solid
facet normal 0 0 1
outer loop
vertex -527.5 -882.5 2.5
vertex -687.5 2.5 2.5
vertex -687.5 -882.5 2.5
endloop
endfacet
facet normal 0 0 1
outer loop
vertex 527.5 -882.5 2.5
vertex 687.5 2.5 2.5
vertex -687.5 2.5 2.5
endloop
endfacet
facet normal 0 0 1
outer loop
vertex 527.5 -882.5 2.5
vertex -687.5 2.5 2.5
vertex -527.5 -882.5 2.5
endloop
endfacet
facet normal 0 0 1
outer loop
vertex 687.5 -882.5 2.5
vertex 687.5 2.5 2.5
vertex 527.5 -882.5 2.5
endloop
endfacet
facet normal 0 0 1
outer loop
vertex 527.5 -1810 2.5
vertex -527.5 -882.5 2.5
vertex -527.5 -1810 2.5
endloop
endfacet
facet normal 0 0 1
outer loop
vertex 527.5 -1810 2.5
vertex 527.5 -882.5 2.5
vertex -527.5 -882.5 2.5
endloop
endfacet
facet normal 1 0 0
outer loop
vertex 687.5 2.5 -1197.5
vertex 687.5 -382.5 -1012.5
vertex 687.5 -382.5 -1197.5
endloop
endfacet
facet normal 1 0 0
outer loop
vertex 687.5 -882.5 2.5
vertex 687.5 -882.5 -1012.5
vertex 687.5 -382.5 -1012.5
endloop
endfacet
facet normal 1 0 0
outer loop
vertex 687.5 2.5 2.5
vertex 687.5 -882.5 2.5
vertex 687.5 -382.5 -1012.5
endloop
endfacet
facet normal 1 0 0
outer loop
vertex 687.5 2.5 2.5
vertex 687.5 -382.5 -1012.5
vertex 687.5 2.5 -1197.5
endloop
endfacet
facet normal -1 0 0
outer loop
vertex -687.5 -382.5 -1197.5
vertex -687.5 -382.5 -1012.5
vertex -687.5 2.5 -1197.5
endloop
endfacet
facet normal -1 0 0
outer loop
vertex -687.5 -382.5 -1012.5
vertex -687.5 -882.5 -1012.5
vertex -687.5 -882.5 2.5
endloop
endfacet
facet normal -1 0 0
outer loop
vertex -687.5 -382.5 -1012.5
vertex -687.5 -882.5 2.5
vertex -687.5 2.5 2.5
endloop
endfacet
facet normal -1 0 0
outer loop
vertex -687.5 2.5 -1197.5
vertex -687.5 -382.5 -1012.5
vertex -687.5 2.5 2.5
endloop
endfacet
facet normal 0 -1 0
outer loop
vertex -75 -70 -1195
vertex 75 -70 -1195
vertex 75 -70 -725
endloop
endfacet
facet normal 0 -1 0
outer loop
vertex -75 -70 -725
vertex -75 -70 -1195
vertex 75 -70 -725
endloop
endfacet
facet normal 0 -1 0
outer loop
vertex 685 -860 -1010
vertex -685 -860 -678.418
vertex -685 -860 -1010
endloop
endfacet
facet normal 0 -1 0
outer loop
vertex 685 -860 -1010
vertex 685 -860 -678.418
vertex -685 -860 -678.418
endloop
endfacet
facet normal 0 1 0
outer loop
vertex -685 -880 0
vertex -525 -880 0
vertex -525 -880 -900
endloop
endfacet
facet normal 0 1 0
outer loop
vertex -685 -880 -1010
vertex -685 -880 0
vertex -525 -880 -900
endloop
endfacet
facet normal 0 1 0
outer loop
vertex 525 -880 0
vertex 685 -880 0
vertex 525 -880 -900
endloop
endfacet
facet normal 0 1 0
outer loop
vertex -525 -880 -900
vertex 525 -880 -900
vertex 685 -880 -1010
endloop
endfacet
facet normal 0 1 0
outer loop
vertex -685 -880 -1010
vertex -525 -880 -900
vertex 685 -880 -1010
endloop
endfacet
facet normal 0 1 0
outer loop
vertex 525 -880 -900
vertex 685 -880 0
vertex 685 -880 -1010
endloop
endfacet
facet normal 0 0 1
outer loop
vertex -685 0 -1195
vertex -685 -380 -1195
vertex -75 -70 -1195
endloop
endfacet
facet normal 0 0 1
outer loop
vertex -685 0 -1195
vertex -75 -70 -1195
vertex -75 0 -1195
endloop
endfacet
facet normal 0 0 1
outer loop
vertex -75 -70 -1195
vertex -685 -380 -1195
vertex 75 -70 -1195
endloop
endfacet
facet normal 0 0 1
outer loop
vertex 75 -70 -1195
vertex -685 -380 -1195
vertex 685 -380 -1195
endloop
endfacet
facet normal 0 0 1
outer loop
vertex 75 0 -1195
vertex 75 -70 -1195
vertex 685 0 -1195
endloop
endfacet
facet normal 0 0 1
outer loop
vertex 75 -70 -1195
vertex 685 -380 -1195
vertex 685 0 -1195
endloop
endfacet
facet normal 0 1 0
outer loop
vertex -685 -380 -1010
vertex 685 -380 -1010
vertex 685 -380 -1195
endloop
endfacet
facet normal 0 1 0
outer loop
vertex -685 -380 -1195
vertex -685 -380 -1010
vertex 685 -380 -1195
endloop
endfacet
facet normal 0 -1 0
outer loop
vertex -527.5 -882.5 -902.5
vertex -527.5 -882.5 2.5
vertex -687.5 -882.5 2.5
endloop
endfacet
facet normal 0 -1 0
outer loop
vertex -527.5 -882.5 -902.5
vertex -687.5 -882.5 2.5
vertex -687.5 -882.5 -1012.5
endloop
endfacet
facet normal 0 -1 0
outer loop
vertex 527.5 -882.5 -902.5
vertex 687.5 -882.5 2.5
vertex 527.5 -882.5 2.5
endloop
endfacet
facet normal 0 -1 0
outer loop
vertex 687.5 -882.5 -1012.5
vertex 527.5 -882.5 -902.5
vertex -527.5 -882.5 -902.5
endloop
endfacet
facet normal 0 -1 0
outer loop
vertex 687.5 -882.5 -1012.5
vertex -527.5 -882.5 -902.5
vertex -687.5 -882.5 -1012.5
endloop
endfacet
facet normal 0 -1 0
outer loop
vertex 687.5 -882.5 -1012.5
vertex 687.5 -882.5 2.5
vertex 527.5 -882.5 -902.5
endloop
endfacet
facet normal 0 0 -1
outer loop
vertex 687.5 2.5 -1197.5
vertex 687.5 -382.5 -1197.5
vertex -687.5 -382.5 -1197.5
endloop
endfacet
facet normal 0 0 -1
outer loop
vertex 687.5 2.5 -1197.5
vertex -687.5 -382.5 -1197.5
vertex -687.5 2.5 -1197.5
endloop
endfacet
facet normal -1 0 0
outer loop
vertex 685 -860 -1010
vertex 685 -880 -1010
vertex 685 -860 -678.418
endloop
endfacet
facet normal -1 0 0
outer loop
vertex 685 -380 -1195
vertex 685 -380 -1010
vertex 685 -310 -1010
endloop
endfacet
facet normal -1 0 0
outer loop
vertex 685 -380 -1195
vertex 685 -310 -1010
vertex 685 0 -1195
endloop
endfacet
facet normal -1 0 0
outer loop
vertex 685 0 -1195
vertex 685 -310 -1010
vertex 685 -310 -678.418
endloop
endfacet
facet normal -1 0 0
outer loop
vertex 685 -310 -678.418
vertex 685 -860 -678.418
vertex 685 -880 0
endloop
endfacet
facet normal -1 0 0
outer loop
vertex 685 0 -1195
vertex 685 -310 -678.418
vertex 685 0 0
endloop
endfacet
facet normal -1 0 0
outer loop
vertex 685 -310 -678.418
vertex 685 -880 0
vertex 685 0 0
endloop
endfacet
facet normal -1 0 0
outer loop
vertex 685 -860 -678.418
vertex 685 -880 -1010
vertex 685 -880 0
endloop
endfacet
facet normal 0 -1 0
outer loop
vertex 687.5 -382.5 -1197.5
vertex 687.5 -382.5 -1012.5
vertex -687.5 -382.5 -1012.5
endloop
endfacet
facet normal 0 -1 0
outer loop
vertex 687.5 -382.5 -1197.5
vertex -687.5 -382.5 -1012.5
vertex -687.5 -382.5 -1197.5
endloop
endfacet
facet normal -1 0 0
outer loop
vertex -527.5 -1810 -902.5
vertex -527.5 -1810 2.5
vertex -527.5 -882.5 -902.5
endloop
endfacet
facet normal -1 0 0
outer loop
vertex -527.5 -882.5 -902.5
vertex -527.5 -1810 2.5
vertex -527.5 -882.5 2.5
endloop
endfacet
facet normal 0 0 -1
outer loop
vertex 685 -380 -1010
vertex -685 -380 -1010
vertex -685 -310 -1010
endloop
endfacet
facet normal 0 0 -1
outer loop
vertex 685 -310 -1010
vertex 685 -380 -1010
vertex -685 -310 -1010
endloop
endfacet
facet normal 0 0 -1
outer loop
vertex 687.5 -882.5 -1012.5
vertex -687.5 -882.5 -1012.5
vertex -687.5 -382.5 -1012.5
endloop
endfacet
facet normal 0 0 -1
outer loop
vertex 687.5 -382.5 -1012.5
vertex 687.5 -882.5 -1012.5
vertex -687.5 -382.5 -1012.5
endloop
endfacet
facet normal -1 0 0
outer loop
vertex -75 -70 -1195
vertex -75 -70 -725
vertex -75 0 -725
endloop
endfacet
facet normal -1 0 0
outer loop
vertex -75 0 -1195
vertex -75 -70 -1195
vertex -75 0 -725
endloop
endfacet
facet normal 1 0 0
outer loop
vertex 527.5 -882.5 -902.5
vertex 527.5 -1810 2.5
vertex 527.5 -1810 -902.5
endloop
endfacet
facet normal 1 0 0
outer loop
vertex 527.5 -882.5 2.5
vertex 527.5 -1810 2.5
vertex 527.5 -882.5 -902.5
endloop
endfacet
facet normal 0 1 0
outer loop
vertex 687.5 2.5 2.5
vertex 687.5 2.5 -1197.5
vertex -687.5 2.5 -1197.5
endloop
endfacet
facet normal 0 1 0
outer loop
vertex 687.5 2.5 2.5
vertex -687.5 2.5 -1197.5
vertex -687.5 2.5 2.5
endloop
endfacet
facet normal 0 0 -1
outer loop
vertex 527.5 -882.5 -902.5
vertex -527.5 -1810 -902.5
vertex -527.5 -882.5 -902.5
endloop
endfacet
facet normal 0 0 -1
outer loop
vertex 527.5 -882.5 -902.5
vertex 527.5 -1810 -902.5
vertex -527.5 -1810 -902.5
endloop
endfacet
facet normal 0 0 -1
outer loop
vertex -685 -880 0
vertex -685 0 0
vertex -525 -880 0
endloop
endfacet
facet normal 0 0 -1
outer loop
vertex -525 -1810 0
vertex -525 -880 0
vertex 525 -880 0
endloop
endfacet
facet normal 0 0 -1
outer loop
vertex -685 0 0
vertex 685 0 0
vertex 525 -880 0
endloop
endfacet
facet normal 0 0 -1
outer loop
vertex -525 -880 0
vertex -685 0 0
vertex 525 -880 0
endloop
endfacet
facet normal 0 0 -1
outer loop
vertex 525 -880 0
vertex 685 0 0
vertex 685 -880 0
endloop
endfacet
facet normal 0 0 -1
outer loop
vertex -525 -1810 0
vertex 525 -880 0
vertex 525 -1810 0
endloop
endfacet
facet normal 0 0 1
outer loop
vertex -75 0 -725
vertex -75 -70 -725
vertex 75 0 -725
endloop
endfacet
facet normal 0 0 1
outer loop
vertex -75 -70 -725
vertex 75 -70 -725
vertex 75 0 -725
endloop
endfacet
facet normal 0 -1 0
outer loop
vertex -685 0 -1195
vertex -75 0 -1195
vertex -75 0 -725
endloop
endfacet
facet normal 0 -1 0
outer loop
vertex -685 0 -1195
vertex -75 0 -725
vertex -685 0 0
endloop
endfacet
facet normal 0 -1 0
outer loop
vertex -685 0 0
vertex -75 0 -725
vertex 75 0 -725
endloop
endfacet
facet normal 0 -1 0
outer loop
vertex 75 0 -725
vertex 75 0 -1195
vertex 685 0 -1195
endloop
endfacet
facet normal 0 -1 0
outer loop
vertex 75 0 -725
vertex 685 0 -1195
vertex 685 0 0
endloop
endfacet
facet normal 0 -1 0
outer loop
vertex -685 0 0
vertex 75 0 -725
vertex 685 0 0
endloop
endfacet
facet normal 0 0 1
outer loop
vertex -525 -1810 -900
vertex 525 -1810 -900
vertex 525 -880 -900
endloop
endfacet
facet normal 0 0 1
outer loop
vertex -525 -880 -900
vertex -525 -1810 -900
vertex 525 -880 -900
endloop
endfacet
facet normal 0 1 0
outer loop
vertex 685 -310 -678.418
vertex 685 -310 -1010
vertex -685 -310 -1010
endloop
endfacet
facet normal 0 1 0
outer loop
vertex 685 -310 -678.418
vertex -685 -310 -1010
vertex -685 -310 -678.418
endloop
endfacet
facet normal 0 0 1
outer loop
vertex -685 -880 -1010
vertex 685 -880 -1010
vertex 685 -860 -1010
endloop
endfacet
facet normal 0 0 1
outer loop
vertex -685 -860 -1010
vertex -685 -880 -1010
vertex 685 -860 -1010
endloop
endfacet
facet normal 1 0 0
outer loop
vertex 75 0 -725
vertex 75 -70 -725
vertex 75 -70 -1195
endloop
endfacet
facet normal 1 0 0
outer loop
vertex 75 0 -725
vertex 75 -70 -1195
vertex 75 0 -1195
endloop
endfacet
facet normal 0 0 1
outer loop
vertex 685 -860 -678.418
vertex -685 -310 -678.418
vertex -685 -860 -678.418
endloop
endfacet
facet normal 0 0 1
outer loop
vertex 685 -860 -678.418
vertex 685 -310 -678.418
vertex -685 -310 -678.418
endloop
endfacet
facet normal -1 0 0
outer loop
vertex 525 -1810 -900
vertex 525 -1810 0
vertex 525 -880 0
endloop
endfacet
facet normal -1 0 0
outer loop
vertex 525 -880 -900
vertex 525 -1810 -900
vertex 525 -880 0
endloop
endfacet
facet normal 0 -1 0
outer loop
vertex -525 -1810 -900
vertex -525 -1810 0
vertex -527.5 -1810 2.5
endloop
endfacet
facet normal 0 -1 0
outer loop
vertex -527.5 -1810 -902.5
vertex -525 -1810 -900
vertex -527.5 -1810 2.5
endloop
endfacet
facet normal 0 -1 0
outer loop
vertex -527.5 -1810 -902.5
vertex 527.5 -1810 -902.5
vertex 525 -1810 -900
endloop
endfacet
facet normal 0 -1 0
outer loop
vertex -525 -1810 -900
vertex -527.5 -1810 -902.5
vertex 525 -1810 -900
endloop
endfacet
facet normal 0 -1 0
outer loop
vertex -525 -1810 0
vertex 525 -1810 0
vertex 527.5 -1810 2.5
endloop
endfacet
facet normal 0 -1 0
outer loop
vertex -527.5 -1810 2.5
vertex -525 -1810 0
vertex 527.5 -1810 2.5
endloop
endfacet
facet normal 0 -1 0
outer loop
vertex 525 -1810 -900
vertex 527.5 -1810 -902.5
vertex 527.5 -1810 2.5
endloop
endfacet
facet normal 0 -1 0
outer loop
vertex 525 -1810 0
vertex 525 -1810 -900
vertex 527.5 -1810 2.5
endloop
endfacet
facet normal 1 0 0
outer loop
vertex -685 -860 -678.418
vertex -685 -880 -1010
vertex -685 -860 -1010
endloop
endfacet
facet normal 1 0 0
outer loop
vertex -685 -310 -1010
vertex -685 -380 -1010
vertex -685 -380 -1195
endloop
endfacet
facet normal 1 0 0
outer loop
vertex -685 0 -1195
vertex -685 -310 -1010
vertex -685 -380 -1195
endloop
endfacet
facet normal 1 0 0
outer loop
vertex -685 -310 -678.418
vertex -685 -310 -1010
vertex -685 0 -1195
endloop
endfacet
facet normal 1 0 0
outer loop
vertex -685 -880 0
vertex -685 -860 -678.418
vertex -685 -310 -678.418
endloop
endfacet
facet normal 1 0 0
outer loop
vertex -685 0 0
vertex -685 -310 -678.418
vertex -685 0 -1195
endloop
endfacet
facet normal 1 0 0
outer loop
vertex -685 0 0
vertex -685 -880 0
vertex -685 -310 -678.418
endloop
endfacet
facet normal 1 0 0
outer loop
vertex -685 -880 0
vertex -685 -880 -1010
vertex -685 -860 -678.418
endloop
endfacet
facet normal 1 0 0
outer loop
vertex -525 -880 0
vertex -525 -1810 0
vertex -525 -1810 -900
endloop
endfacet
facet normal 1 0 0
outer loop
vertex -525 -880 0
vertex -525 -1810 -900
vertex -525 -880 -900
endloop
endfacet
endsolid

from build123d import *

# Parameters (mm, degrees)
F0_W     = 70
F0_H     = 470
F1_DEPTH = 685
F0_W_2   = 930
F0_H_2   = 900
F2_DEPTH = 525
F3_T     = 2.5
F4_DEPTH = 685
F5_DEPTH = 75


with BuildPart() as f1:
    # F0 (on Right) → F1 (new body, symmetric)
    with BuildSketch(Plane.YZ):
        Polygon((0, -725), (0, 0), (-880, 0), (-880, -900), (-880, -1010), (-860, -1010), (-860, -678.4179210663), (-310, -678.4179210663), (-310, -1010), (-380, -1010), (-380, -1195), (-70, -1195), (-70, -725), align=None)
        with Locations((-35, -960)):
            Rectangle(F0_W, F0_H)
        Polygon((-860, -678.4179210663), (-860, -1010), (-380, -1010), (-310, -1010), (-310, -678.4179210663), align=None)
    extrude(amount=F1_DEPTH, both=True)

    # F0 (on Right) → F2 (join, symmetric)
    with BuildSketch(Plane.YZ):
        with Locations((-1345, -450)):
            Rectangle(F0_W_2, F0_H_2)
    extrude(amount=F2_DEPTH, both=True)

    # F3
    f3_openings = [f1.faces().sort_by_distance(p)[0] for p in [
        (0, -1810, -450),
    ]]
    offset(amount=F3_T, openings=f3_openings, kind=Kind.INTERSECTION)

    # F0 (on Right) → F4 (join, symmetric)
    with BuildSketch(Plane.YZ):
        Polygon((-860, -678.4179210663), (-860, -1010), (-380, -1010), (-310, -1010), (-310, -678.4179210663), align=None)
    extrude(amount=F4_DEPTH, both=True)

    # F0 (on Right) → F5 (join, symmetric)
    with BuildSketch(Plane.YZ):
        with Locations((-35, -960)):
            Rectangle(F0_W, F0_H)
    extrude(amount=F5_DEPTH, both=True)


solid = f1.part
